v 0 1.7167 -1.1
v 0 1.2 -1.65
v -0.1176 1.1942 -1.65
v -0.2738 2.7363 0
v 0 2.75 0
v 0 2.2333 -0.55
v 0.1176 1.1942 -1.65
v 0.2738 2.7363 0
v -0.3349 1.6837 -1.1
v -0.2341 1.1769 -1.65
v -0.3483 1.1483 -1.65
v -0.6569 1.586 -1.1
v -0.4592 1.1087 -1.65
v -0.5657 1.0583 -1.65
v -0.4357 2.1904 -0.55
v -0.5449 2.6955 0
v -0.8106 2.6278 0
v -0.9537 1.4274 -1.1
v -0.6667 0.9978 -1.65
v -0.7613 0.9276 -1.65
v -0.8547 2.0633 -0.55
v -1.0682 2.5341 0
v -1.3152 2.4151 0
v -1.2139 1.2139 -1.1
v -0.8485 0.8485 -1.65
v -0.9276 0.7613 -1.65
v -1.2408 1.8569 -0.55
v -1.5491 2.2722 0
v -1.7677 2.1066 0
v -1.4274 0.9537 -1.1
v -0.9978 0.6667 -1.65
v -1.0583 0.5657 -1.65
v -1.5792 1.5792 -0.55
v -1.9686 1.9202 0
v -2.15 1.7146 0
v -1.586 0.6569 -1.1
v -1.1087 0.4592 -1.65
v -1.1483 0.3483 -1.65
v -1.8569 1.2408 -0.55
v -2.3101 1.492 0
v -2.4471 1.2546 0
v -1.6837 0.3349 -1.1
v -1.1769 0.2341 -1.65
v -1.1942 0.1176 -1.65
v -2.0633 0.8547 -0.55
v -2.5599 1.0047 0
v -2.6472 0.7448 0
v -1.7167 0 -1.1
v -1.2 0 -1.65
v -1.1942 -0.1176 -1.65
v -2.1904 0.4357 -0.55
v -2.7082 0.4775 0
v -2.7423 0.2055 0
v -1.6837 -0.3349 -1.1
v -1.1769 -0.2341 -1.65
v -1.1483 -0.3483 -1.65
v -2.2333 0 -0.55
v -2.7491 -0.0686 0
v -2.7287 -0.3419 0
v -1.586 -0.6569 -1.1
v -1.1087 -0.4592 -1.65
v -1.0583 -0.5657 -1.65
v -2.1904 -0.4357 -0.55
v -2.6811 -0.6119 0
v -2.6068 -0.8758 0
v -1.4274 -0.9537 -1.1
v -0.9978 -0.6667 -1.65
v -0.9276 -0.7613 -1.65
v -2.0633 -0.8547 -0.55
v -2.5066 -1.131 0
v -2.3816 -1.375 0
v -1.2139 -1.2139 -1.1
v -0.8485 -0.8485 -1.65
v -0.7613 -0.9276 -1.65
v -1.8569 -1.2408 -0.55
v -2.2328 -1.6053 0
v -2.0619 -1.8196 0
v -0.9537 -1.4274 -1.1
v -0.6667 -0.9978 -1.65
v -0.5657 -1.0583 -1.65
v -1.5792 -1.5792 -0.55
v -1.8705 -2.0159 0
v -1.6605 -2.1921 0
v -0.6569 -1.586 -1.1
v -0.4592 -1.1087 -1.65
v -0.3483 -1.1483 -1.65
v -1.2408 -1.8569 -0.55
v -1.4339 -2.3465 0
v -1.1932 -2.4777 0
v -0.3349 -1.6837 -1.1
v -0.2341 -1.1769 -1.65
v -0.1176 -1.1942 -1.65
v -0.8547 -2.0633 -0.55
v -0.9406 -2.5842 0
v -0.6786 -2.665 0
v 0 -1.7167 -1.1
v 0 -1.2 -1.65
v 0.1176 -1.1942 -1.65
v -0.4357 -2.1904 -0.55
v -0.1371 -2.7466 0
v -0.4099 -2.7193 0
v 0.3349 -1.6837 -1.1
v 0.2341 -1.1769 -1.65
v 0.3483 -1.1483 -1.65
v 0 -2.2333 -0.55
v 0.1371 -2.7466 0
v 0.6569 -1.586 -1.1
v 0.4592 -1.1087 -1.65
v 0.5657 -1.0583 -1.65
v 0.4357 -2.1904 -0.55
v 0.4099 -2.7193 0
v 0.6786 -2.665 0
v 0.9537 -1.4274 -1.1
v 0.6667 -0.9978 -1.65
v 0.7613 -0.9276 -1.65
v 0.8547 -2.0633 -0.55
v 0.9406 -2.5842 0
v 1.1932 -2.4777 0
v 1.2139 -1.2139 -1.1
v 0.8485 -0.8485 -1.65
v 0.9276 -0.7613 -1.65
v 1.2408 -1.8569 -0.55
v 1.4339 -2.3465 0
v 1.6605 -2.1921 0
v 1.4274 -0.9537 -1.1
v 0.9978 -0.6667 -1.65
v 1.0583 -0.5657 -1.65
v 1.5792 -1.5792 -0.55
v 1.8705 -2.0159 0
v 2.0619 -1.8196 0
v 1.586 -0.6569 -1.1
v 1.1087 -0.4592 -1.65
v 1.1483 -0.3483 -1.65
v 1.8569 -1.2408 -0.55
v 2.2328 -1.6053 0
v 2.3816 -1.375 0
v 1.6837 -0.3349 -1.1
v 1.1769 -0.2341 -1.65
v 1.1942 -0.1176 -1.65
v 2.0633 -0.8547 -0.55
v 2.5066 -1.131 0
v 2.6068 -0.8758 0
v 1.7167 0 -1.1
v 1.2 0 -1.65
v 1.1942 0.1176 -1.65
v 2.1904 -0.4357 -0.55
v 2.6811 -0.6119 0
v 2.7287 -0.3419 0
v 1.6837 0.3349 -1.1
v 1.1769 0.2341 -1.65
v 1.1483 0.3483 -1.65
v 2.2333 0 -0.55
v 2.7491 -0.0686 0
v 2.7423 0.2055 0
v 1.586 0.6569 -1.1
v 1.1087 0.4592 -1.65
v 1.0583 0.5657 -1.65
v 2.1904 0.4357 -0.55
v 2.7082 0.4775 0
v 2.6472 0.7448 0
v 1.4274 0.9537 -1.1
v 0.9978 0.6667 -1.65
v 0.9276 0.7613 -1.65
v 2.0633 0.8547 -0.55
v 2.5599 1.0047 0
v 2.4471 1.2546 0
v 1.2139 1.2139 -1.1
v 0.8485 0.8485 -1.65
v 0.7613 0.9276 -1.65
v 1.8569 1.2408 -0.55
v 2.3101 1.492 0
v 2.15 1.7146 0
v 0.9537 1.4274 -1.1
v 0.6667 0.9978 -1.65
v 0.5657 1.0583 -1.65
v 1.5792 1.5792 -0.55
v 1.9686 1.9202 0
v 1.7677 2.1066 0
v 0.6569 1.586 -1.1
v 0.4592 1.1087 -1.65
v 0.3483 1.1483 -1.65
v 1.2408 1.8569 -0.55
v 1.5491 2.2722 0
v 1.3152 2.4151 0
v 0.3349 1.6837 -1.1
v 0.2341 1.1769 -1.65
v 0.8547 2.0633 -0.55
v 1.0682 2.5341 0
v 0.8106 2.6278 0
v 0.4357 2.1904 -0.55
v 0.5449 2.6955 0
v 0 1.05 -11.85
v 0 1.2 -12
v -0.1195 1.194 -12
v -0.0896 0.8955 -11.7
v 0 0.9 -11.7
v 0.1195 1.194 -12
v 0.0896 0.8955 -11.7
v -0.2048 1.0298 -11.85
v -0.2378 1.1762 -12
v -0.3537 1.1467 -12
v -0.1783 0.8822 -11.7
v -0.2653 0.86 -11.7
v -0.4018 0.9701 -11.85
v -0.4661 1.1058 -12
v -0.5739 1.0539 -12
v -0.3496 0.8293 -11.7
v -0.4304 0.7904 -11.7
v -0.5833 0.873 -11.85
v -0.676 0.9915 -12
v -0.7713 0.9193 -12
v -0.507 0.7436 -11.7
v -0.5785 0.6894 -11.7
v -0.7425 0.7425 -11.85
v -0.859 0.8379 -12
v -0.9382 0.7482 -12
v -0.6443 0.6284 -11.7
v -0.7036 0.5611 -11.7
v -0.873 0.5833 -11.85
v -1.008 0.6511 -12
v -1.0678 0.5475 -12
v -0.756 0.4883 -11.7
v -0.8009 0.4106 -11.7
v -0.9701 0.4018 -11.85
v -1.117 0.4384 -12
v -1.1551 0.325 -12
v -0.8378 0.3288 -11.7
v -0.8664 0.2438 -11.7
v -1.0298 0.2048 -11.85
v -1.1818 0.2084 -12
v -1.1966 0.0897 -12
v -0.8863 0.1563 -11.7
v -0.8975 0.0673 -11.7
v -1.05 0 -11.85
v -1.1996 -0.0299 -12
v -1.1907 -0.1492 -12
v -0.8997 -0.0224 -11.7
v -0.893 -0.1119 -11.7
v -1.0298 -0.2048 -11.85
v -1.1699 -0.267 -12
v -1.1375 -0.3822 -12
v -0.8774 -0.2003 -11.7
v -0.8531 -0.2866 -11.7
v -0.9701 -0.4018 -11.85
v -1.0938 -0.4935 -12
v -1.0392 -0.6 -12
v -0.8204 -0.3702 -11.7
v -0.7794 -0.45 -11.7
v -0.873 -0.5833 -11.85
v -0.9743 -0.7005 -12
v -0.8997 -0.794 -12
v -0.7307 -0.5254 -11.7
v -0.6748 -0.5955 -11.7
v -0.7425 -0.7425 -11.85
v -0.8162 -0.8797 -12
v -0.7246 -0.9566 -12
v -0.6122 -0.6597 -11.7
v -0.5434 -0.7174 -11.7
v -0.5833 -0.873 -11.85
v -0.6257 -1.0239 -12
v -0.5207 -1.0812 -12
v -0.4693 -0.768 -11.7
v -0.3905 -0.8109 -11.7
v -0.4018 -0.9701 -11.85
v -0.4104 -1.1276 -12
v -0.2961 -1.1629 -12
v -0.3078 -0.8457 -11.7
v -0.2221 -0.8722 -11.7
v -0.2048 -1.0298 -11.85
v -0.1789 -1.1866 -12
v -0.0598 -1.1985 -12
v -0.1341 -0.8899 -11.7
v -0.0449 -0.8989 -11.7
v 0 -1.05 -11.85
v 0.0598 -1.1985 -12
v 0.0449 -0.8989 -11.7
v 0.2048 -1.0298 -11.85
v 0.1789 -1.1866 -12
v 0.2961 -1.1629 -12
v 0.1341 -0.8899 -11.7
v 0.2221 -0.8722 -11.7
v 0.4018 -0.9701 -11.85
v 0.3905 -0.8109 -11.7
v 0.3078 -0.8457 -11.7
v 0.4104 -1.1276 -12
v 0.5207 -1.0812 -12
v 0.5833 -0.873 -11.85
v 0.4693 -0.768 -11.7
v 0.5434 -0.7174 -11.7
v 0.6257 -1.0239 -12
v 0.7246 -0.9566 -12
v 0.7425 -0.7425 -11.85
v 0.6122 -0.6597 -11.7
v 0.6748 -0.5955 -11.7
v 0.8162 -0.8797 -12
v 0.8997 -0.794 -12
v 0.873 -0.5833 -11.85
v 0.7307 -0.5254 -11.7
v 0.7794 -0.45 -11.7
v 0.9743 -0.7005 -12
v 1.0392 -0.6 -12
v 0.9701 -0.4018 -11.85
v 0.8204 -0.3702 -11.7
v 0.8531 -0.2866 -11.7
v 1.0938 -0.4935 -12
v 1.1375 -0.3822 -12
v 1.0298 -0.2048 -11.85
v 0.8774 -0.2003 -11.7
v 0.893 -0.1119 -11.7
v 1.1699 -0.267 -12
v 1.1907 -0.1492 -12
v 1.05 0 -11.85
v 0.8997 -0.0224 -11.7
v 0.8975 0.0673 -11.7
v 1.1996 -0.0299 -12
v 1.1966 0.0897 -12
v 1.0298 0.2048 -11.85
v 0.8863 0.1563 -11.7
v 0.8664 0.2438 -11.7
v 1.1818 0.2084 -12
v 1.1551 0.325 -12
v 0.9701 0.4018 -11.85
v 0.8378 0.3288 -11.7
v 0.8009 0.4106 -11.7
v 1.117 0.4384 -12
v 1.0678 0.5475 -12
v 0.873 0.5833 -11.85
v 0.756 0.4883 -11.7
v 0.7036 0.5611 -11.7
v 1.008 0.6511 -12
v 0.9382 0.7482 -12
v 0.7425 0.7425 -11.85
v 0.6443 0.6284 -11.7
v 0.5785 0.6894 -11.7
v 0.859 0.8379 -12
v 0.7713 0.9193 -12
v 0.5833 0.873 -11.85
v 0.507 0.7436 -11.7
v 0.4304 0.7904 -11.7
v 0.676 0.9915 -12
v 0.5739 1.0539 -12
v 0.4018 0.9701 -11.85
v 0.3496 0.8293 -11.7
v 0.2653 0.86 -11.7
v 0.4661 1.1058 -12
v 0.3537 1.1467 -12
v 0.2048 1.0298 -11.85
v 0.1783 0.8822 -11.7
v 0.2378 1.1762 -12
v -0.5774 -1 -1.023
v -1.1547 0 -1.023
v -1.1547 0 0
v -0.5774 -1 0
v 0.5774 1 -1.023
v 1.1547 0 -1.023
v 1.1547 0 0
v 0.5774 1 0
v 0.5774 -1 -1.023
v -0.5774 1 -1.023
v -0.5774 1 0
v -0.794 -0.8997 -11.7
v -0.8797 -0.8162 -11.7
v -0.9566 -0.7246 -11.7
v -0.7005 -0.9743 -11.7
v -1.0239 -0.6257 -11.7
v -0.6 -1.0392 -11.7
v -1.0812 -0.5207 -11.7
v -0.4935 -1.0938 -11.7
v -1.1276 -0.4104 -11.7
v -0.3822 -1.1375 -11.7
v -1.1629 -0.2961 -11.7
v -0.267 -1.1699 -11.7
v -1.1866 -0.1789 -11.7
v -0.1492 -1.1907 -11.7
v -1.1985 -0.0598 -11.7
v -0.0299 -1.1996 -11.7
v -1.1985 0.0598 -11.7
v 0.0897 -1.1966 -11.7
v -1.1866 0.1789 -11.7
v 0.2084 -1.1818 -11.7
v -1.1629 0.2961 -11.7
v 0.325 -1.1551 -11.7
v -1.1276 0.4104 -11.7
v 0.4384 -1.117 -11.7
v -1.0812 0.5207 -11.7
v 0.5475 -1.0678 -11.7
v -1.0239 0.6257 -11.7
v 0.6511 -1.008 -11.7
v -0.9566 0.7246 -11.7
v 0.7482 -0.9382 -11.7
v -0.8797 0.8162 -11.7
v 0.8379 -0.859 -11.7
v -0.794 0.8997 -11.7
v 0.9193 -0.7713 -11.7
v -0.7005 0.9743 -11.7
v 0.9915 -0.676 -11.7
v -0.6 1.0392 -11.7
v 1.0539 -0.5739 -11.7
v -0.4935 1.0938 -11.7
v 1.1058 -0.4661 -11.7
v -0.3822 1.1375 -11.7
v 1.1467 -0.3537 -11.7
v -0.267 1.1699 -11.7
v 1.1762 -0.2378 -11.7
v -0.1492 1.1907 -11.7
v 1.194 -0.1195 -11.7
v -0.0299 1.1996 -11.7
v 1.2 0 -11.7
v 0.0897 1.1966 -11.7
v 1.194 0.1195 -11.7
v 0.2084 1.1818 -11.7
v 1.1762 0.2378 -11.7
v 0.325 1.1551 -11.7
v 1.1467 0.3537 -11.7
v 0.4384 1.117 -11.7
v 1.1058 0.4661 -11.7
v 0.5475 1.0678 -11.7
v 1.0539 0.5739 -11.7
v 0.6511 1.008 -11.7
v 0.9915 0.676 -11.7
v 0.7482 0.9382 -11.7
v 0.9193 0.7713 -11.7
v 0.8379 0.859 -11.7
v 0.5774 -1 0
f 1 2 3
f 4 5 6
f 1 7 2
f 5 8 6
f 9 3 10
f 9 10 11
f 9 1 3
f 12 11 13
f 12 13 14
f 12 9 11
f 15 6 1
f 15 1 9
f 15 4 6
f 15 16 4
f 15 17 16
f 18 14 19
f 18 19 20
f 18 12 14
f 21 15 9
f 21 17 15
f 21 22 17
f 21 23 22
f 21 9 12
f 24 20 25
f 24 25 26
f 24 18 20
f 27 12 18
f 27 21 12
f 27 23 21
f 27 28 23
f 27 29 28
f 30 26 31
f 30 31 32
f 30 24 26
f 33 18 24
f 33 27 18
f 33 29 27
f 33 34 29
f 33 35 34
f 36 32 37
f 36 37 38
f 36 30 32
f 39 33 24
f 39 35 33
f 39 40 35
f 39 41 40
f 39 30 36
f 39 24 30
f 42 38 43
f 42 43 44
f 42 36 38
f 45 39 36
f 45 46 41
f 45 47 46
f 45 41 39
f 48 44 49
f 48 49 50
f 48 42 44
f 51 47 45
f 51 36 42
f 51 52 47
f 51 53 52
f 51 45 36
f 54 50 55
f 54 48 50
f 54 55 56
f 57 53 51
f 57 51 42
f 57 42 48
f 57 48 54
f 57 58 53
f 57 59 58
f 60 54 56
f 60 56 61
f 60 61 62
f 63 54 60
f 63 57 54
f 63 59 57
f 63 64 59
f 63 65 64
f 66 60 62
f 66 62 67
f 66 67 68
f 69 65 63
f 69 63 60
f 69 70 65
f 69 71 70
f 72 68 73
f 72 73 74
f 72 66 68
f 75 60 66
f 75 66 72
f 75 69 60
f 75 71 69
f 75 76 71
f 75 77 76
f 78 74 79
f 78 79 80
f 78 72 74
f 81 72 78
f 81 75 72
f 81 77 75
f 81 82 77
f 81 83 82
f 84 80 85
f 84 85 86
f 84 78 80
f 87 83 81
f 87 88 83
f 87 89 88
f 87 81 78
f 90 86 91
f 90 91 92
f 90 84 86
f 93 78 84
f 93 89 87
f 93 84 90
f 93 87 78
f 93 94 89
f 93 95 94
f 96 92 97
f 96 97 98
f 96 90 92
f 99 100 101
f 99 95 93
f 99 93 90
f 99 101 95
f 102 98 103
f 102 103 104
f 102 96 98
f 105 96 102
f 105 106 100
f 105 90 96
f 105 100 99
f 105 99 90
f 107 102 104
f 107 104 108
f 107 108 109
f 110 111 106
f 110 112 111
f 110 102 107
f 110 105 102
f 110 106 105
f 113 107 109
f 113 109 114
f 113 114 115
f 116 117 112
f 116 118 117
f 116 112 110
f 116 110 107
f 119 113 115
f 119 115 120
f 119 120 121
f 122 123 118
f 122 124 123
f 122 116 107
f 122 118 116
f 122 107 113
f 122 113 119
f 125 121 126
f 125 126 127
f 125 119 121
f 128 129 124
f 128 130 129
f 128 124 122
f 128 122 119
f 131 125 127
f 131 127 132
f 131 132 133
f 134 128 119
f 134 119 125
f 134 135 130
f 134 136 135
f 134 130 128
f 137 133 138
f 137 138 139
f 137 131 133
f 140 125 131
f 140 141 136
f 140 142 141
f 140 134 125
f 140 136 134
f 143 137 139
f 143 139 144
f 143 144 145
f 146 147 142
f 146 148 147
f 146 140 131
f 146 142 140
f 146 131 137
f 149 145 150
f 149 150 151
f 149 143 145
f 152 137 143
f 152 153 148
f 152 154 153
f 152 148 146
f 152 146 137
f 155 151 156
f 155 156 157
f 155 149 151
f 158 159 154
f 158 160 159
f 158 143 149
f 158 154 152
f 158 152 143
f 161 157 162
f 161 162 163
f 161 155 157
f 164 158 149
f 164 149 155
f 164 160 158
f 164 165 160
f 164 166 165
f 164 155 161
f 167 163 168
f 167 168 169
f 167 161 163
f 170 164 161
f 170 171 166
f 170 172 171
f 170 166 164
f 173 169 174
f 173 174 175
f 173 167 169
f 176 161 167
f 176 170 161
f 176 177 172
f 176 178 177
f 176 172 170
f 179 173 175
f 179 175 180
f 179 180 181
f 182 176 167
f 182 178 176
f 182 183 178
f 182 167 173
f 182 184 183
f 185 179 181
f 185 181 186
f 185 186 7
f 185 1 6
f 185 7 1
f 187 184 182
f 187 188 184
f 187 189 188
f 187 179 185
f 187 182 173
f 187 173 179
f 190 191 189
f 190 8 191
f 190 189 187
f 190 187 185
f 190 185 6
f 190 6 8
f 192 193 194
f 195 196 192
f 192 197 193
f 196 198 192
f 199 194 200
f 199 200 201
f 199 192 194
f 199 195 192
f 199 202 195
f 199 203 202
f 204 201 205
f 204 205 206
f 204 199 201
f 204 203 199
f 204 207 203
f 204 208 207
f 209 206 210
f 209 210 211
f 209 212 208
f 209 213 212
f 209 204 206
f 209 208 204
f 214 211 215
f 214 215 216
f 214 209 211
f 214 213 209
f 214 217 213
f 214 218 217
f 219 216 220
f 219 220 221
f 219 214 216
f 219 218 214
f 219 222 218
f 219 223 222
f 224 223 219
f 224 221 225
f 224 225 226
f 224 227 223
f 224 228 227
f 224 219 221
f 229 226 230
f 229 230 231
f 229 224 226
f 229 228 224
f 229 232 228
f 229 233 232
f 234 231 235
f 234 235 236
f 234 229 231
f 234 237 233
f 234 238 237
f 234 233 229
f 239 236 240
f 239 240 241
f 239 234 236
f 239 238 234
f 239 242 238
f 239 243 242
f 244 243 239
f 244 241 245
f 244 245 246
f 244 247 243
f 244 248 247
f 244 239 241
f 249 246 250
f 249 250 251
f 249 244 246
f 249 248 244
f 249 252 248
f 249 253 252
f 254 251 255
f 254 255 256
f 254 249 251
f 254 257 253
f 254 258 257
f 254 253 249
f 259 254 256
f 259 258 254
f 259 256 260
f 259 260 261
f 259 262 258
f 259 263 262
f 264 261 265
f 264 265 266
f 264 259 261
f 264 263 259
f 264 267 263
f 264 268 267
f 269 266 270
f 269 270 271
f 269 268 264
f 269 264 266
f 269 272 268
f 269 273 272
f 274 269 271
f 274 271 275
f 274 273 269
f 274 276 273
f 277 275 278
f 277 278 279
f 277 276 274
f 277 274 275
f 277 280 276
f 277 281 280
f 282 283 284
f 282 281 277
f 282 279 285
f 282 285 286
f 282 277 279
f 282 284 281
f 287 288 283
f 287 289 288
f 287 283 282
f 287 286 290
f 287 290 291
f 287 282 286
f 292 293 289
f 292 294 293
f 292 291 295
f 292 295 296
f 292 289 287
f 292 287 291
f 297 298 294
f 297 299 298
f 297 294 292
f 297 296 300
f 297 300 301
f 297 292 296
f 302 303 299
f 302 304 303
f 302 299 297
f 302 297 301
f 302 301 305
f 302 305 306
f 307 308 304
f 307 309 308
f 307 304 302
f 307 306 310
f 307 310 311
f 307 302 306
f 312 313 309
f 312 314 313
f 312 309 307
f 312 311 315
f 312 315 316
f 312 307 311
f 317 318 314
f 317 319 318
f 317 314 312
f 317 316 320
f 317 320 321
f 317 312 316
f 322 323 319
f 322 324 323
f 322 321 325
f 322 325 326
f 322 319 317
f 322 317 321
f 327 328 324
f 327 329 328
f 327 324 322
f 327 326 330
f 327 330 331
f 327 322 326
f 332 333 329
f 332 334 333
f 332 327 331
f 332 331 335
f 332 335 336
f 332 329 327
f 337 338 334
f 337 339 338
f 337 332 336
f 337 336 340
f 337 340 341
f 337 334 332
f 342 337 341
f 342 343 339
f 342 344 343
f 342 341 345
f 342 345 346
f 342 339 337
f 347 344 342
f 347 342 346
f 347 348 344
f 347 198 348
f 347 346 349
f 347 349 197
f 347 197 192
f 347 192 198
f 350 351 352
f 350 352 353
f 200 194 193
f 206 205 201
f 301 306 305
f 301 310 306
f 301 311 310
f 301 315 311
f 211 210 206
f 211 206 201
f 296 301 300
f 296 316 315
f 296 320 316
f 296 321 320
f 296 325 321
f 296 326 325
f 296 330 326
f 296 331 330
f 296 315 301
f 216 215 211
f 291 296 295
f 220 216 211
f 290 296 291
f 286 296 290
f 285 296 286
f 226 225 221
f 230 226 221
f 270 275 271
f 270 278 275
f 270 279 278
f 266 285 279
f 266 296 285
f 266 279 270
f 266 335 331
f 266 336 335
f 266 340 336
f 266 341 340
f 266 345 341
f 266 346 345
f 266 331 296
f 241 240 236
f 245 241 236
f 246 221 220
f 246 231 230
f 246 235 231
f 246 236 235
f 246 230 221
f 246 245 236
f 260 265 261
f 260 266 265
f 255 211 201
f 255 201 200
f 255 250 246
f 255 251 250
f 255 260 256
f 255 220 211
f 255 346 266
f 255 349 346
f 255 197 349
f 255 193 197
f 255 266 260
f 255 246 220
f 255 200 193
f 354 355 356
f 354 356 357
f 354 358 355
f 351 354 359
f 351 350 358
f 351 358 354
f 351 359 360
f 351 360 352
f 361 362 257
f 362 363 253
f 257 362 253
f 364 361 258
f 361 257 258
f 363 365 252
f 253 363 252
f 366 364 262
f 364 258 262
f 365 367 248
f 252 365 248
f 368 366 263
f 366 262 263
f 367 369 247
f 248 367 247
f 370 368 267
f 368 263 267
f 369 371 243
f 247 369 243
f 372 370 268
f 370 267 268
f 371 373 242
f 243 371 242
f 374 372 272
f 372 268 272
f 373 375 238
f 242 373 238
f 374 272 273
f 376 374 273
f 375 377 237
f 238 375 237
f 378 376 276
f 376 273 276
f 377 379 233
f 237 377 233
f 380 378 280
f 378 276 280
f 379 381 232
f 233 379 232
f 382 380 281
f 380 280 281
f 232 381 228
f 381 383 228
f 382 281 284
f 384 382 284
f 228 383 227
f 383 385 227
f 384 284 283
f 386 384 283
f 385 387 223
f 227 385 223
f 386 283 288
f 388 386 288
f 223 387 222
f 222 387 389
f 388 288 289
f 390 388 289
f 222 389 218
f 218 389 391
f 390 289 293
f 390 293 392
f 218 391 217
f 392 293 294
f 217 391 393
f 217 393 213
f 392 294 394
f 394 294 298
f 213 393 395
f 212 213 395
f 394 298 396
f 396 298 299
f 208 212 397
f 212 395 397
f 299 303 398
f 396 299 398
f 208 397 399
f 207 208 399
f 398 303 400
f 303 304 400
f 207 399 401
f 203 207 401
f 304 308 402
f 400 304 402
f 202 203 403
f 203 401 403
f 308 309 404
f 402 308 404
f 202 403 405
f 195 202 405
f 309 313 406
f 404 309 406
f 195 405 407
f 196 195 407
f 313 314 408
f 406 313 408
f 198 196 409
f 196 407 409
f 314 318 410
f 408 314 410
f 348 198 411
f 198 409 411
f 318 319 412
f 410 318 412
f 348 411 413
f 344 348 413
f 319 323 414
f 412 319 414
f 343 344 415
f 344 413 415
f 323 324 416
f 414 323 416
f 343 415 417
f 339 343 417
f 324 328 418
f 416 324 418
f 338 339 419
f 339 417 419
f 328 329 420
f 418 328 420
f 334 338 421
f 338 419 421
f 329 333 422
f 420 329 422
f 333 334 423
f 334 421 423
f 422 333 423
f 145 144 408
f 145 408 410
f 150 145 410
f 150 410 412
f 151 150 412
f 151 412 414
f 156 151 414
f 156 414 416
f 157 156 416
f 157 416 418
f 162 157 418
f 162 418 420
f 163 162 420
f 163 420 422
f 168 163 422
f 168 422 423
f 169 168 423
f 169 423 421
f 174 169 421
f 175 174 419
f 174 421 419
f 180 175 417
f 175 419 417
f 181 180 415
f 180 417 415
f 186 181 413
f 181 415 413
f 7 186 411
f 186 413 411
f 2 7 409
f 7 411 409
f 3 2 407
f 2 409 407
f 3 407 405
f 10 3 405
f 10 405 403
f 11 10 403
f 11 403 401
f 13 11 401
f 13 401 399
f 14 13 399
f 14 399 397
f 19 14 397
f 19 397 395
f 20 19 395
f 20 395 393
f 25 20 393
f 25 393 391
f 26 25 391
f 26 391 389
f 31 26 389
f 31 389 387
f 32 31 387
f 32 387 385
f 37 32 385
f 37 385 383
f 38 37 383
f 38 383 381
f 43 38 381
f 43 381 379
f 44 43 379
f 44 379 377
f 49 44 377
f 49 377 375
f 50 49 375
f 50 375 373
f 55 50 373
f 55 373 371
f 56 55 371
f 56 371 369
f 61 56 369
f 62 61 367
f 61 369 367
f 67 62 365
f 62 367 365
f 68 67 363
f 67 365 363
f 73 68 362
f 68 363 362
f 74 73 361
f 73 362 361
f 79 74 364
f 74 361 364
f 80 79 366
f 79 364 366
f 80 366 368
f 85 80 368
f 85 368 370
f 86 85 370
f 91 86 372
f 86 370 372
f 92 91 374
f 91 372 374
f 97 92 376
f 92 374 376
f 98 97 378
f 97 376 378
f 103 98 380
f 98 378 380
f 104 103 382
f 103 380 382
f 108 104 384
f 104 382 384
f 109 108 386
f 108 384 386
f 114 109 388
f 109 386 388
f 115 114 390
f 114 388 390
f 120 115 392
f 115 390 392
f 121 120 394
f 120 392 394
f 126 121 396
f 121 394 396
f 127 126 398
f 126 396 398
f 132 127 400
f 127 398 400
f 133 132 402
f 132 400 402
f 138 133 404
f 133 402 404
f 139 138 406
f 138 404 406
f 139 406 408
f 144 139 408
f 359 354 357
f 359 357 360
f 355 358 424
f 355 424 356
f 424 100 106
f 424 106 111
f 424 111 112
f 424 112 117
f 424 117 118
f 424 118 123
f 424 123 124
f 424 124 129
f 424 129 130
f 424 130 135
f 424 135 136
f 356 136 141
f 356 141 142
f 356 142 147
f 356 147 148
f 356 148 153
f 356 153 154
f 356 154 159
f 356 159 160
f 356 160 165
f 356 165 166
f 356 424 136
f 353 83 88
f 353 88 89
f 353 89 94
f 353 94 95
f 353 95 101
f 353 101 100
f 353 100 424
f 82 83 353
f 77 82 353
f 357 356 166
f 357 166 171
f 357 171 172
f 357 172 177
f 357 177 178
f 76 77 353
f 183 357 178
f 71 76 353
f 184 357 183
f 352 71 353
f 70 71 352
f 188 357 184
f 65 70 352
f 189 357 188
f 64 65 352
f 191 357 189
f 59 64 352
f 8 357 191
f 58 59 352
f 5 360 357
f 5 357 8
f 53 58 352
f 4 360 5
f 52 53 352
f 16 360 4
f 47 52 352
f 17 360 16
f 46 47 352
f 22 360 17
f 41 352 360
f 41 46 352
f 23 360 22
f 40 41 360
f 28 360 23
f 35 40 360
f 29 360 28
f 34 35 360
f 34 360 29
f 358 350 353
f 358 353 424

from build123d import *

# Parameters (mm, degrees)
F_0165_CONE_ROTATE_ANGLE    = 90
F_0166_CYLINDER_SKETCH_R    = 1.2
F_0166_CYLINDER_DEPTH       = 10.05
F_0167_CONE_ROTATE_ANGLE    = 90
F_0172_EXTRUDE_DEPTH        = 1.033
F_0172_EXTRUDE_ROTATE_ANGLE = 120


with BuildPart() as part:
    # 0165_cone_Sketch → 0165_cone (revolve)
    with BuildSketch(Plane.XY, mode=Mode.PRIVATE) as f_0165_cone_sk:
        Polygon((0, 0), (1.2, 0), (2.75, 1.65), (0, 1.65), align=None)
    revolve(f_0165_cone_sk.sketch.rotate(Axis((0, -100, 0), (0, 1, 0)), 90), axis=Axis((0, -100, 0), (0, 1, 0)))


with BuildPart() as part_1:
    # 0165_cone_Rotate: moved
    add(part.part.rotate(Axis((0, 0, 0), (1, 0, 0)), F_0165_CONE_ROTATE_ANGLE))


with BuildPart() as part_2:
    # 0165_cone_Translate: moved
    add(part_1.part.moved(Location((0, 0, -1.65))))


with BuildPart() as body_2:
    # 0166_cylinder_Sketch → 0166_cylinder (new body)
    with BuildSketch(Plane.XY):
        Circle(F_0166_CYLINDER_SKETCH_R)
    extrude(amount=F_0166_CYLINDER_DEPTH)


with BuildPart() as body_2_1:
    # 0166_cylinder_Translate: moved
    add(body_2.part.moved(Location((0, 0, -11.7))))


with BuildPart() as body_3:
    # 0167_cone_Sketch → 0167_cone (revolve)
    with BuildSketch(Plane.XY, mode=Mode.PRIVATE) as f_0167_cone_sk:
        Polygon((0, 0), (1.2, 0), (0.9, 0.3), (0, 0.3), align=None)
    revolve(f_0167_cone_sk.sketch.rotate(Axis((0, -100, 0), (0, 1, 0)), 90), axis=Axis((0, -100, 0), (0, 1, 0)))


with BuildPart() as body_3_1:
    # 0167_cone_Rotate: moved
    add(body_3.part.rotate(Axis((0, 0, 0), (1, 0, 0)), F_0167_CONE_ROTATE_ANGLE))


with BuildPart() as body_3_2:
    # 0167_cone_Translate: moved
    add(body_3_1.part.moved(Location((0, 0, -12))))


with BuildPart() as body_2_2:
    add(body_2_1.part)

    # 0169_add: union body 3
    add(body_3_2.part)


with BuildPart() as part_3:
    add(part_2.part)

    # 0171_add: union body 2
    add(body_2_2.part)


with BuildPart() as body_2_2_1:
    # 0172_extrude_Sketch → 0172_extrude (new body)
    with BuildSketch(Plane.XY):
        Polygon((0, 0), (1.154700538, 0), (1.732050808, 1), (1.154700538, 2), (0, 2), (-0.577350269, 1), align=None)
    extrude(amount=F_0172_EXTRUDE_DEPTH)


with BuildPart() as body_2_2_2:
    # 0172_extrude_Rotate: moved
    add(body_2_2_1.part.rotate(Axis((0, 0, 0), (0, 0, 1)), F_0172_EXTRUDE_ROTATE_ANGLE))


with BuildPart() as body_2_2_3:
    # 0172_extrude_Translate: moved
    add(body_2_2_2.part.moved(Location((1.154700538, 0, -1.023))))


with BuildPart() as part_4:
    add(part_3.part)

    # 0174_sub: cut body 2 2
    add(body_2_2_3.part, mode=Mode.SUBTRACT)


solid = part_4.part
